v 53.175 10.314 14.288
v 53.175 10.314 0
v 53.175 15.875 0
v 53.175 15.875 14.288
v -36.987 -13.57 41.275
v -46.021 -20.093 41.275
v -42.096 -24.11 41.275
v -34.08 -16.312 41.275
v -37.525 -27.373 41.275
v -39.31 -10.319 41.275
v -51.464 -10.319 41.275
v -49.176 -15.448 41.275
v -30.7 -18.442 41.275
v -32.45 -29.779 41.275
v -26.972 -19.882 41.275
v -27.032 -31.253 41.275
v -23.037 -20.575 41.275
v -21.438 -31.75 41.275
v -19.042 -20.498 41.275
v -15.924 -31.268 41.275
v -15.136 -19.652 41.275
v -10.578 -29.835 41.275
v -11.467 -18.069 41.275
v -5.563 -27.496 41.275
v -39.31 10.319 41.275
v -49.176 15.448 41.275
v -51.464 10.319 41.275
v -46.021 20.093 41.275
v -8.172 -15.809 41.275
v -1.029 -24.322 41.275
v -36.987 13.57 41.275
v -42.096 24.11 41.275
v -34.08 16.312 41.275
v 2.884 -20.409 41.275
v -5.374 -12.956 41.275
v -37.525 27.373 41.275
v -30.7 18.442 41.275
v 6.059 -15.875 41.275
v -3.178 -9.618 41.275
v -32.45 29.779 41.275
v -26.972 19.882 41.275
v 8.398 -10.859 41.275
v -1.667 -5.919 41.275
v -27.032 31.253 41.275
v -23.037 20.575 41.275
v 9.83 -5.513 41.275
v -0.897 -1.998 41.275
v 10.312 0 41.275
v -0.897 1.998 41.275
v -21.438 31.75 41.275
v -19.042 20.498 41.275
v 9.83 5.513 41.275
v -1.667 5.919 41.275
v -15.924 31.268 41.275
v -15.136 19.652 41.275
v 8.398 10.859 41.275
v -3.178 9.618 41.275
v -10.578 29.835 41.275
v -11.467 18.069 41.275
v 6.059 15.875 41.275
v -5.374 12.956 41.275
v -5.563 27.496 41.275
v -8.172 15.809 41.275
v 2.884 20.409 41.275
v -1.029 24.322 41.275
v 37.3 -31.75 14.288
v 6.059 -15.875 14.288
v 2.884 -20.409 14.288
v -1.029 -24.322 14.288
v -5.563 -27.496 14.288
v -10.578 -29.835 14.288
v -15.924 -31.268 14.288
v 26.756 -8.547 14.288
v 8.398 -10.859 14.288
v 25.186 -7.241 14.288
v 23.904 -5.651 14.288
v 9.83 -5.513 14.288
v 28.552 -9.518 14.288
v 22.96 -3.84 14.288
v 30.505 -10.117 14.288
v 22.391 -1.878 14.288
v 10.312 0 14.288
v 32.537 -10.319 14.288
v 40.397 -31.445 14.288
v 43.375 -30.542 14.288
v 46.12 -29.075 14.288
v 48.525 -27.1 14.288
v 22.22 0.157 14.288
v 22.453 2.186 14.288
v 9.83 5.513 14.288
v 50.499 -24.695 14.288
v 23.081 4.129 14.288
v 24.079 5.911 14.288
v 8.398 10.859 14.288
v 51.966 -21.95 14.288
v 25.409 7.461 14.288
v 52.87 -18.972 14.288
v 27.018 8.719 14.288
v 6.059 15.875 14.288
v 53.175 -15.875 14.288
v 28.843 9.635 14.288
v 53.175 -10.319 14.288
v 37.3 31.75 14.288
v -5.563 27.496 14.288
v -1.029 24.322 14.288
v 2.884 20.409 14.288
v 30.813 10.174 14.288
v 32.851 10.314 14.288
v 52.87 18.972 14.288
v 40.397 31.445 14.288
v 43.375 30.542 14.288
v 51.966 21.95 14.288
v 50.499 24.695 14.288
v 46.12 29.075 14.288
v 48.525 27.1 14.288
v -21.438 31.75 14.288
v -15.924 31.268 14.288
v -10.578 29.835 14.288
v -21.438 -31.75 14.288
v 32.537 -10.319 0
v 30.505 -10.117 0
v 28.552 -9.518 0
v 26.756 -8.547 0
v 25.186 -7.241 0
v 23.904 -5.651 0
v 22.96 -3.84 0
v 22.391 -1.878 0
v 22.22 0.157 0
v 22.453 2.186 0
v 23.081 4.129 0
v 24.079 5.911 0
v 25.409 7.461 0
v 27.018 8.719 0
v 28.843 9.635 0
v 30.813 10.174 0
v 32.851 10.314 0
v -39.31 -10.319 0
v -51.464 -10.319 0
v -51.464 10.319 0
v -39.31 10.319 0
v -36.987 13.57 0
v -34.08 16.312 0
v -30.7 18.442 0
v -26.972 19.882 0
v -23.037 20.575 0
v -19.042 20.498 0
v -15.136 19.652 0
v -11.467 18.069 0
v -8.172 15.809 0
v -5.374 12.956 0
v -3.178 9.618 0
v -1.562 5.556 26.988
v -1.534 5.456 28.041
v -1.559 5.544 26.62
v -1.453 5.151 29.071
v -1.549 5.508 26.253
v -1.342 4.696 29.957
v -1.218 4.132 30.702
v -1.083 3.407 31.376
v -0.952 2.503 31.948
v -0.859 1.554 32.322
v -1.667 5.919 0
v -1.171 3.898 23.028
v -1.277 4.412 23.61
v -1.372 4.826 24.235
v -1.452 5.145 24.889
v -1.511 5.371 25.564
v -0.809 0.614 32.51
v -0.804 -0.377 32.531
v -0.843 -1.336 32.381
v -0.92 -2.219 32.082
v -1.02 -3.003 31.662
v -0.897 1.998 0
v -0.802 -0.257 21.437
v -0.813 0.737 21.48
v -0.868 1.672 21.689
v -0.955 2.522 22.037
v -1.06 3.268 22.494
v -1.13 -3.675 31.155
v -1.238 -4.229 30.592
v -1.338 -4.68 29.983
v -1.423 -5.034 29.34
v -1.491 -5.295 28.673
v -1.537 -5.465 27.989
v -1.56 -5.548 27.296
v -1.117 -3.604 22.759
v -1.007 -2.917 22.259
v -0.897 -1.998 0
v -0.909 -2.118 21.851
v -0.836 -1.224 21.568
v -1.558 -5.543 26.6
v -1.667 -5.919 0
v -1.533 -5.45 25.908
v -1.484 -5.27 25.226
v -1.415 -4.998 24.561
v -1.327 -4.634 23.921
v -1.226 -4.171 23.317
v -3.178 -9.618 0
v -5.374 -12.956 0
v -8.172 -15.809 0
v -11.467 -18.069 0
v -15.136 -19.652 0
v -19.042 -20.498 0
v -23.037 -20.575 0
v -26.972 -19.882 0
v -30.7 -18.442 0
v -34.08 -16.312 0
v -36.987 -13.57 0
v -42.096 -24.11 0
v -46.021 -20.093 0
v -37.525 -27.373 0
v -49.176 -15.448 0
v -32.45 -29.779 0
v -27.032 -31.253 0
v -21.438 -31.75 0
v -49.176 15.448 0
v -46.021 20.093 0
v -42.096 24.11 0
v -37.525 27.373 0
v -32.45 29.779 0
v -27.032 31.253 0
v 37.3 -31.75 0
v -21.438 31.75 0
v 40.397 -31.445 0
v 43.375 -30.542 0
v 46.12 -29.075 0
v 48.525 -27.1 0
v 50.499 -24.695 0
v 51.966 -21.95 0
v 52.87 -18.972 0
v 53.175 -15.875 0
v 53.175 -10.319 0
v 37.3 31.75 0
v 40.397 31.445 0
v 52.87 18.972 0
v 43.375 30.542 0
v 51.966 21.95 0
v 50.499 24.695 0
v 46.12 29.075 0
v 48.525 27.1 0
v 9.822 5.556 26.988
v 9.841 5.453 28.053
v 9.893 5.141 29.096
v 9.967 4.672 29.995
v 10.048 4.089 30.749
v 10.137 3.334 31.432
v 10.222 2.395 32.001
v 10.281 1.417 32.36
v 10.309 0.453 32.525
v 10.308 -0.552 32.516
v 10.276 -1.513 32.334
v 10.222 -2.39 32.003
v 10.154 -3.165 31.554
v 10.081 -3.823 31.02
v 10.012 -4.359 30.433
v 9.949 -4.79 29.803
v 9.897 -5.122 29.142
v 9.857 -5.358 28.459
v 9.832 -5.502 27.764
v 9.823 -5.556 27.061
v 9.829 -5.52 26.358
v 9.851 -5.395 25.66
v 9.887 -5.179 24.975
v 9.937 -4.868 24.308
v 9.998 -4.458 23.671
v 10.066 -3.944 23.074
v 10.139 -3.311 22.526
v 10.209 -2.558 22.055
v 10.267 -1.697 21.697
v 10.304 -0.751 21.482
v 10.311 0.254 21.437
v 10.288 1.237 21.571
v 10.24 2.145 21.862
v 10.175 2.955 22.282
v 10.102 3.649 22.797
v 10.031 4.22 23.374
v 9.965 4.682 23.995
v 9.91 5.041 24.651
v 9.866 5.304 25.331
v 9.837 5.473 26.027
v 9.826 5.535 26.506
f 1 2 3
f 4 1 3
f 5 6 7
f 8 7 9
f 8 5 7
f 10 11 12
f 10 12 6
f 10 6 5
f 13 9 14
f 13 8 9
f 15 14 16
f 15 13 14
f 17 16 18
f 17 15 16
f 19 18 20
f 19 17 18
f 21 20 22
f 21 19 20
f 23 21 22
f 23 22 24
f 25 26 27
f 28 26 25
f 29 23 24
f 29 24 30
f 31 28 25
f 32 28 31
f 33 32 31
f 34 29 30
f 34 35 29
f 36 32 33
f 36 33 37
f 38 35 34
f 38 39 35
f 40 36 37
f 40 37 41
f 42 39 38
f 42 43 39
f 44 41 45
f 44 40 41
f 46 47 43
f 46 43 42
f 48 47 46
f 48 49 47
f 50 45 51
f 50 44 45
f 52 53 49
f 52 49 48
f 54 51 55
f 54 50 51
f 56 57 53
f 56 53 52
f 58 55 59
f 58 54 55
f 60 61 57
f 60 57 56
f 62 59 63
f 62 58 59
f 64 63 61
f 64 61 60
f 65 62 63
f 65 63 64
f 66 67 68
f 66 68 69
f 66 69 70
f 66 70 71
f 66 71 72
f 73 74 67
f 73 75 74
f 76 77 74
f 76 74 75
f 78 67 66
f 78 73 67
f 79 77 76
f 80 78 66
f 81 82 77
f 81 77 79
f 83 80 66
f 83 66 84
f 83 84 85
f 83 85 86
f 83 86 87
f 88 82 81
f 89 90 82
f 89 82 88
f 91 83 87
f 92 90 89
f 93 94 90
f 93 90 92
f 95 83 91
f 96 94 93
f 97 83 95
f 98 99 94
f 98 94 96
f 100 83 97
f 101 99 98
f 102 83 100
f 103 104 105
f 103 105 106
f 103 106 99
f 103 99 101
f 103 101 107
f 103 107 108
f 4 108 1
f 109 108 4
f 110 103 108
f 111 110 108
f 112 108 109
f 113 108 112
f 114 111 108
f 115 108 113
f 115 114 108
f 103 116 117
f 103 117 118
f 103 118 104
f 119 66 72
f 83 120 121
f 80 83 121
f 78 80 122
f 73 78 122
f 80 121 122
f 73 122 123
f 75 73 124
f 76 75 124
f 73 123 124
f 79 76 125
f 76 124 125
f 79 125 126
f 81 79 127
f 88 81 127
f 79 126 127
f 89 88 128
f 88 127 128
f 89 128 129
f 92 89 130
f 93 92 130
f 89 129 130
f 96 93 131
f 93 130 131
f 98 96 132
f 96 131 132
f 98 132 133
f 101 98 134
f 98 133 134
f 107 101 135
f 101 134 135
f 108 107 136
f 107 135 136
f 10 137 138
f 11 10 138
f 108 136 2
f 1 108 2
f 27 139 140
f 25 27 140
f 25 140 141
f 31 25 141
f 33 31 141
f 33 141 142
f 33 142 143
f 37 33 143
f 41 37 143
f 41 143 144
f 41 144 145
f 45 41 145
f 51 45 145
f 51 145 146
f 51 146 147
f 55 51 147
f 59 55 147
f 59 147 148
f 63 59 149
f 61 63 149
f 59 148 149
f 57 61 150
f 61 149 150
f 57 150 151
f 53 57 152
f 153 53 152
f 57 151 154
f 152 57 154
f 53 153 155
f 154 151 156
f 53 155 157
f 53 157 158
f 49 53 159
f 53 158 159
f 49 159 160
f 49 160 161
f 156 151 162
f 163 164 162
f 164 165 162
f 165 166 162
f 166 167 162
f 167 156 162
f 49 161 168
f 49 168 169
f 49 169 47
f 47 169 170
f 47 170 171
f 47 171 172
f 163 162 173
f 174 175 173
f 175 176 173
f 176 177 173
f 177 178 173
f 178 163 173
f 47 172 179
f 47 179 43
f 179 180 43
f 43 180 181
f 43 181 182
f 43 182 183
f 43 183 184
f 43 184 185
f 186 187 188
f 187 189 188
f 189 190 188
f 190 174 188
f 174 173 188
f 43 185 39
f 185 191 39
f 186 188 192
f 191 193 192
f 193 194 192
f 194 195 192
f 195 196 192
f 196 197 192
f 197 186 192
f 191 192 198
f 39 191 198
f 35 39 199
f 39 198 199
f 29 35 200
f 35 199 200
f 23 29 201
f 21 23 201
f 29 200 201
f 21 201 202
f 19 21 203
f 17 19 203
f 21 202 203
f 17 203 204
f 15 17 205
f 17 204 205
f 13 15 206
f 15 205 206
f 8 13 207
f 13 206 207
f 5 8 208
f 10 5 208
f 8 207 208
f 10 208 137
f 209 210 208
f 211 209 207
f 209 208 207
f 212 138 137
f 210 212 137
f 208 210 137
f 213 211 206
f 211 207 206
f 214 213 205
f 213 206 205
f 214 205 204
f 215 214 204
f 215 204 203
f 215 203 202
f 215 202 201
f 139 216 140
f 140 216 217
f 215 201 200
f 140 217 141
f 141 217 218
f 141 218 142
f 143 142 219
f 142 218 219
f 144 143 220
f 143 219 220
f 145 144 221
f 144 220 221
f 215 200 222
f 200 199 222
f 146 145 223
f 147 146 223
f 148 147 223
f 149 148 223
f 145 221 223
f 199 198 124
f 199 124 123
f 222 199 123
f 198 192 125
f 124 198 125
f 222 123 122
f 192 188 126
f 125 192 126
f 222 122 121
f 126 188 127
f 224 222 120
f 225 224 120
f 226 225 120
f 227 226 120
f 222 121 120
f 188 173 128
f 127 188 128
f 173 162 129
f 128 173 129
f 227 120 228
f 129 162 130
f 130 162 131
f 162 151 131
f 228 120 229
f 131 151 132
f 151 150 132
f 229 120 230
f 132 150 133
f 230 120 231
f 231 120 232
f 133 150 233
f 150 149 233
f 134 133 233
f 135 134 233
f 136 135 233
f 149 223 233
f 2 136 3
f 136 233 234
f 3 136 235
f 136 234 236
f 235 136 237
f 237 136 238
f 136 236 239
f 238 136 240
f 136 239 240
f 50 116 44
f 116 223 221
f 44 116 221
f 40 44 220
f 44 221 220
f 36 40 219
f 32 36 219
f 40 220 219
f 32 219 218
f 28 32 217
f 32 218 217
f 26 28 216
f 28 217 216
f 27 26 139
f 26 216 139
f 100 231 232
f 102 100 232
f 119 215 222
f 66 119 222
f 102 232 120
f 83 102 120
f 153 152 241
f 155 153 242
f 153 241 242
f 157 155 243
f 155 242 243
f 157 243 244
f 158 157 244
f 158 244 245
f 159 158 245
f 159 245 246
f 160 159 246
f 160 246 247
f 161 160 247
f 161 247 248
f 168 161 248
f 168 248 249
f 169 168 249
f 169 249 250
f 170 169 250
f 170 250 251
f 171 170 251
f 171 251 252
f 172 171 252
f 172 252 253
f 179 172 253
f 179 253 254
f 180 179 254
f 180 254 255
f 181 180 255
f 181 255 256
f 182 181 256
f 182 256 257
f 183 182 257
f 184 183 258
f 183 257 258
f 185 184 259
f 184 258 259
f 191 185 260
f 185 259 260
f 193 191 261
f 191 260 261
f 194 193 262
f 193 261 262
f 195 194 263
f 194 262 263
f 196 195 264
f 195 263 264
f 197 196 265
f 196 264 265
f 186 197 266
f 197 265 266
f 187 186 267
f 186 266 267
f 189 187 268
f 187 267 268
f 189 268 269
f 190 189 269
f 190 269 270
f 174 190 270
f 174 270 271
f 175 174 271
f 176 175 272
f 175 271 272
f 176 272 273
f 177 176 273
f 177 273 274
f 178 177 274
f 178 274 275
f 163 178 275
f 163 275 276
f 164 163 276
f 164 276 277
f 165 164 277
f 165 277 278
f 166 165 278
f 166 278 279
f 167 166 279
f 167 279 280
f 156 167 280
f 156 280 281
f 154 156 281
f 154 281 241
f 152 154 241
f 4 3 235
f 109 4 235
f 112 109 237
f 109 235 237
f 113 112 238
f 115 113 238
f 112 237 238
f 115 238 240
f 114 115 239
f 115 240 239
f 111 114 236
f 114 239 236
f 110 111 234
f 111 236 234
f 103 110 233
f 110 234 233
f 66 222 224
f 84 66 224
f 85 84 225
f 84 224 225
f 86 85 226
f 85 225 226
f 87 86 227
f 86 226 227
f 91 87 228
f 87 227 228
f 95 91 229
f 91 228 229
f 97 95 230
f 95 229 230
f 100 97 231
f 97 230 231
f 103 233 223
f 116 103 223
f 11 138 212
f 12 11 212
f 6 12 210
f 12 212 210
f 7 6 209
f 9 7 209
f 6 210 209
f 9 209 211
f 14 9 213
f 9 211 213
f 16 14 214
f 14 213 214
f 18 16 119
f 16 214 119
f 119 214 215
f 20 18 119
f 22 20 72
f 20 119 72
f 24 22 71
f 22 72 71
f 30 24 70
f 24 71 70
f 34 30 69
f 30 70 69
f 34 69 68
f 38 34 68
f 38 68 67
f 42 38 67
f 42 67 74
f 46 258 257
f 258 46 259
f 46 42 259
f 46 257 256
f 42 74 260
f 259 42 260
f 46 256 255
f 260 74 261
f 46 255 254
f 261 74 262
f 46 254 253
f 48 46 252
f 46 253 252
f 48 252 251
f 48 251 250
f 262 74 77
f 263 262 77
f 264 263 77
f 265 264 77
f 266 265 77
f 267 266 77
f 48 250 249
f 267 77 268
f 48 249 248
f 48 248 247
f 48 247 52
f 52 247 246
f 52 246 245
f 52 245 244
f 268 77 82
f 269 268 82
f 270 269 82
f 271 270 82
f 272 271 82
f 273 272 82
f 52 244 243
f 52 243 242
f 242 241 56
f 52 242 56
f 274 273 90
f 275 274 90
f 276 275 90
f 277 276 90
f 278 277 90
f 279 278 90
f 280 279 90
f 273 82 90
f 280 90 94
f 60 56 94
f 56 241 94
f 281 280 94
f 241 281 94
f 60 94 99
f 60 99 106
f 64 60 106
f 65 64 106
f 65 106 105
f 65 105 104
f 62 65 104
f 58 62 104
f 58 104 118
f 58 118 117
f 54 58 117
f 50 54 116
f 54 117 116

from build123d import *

# Parameters (mm, degrees)
F1_DEPTH = 41.275
F2_DEPTH = 14.2875
F4_R     = 5.55625
F5_DEPTH = 38.1


with BuildPart() as f1:
    # F0 (on Top) → F1 (new body)
    with BuildSketch(Plane.XY):
        with BuildLine():
            ThreePointArc((-21.4376, -31.75), (10.3124, 0), (-21.4376, 31.75))
            ThreePointArc((-21.4376, 31.75), (-39.882683, 25.842628), (-51.46402, 10.31875))
            Line((-51.46402, 10.31875), (-39.310199, 10.31875))
            ThreePointArc((-39.310199, 10.31875), (-0.8001, 0), (-39.310199, -10.31875))
            Line((-39.310199, -10.31875), (-51.46402, -10.31875))
            ThreePointArc((-51.46402, -10.31875), (-39.882683, -25.842628), (-21.4376, -31.75))
        make_face()
    extrude(amount=F1_DEPTH)

    # F0 (on Top) → F2 (join)
    with BuildSketch(Plane.XY):
        with BuildLine():
            ThreePointArc((-21.4376, -31.75), (10.3124, 0), (-21.4376, 31.75))
            ThreePointArc((-21.4376, 31.75), (-39.882683, 25.842628), (-51.46402, 10.31875))
            Line((-51.46402, 10.31875), (-39.310199, 10.31875))
            ThreePointArc((-39.310199, 10.31875), (-0.8001, 0), (-39.310199, -10.31875))
            Line((-39.310199, -10.31875), (-51.46402, -10.31875))
            ThreePointArc((-51.46402, -10.31875), (-39.882683, -25.842628), (-21.4376, -31.75))
        make_face()
        with BuildLine():
            Line((37.2999, 31.75), (-21.4376, 31.75))
            ThreePointArc((-21.4376, 31.75), (10.3124, 0), (-21.4376, -31.75))
            Line((-21.4376, -31.75), (37.2999, -31.75))
            ThreePointArc((37.2999, -31.75), (48.52522, -27.10032), (53.1749, -15.875))
            Line((53.1749, -15.875), (53.1749, -10.31875))
            Line((53.1749, -10.31875), (32.5374, -10.31875))
            ThreePointArc((32.5374, -10.31875), (22.219841, 0.156758), (32.850879, 10.313987))
            Line((32.850879, 10.313987), (53.1749, 10.313987))
            Line((53.1749, 10.313987), (53.1749, 15.875))
            ThreePointArc((53.1749, 15.875), (48.52522, 27.10032), (37.2999, 31.75))
        make_face()
    extrude(amount=F2_DEPTH)

    # F4 (on offset) → F5 (cut)
    with BuildSketch(Plane.YZ.offset(25.4)):
        with Locations((0, 26.9875)):
            Circle(F4_R)
    extrude(amount=-F5_DEPTH, mode=Mode.SUBTRACT)


solid = f1.part
